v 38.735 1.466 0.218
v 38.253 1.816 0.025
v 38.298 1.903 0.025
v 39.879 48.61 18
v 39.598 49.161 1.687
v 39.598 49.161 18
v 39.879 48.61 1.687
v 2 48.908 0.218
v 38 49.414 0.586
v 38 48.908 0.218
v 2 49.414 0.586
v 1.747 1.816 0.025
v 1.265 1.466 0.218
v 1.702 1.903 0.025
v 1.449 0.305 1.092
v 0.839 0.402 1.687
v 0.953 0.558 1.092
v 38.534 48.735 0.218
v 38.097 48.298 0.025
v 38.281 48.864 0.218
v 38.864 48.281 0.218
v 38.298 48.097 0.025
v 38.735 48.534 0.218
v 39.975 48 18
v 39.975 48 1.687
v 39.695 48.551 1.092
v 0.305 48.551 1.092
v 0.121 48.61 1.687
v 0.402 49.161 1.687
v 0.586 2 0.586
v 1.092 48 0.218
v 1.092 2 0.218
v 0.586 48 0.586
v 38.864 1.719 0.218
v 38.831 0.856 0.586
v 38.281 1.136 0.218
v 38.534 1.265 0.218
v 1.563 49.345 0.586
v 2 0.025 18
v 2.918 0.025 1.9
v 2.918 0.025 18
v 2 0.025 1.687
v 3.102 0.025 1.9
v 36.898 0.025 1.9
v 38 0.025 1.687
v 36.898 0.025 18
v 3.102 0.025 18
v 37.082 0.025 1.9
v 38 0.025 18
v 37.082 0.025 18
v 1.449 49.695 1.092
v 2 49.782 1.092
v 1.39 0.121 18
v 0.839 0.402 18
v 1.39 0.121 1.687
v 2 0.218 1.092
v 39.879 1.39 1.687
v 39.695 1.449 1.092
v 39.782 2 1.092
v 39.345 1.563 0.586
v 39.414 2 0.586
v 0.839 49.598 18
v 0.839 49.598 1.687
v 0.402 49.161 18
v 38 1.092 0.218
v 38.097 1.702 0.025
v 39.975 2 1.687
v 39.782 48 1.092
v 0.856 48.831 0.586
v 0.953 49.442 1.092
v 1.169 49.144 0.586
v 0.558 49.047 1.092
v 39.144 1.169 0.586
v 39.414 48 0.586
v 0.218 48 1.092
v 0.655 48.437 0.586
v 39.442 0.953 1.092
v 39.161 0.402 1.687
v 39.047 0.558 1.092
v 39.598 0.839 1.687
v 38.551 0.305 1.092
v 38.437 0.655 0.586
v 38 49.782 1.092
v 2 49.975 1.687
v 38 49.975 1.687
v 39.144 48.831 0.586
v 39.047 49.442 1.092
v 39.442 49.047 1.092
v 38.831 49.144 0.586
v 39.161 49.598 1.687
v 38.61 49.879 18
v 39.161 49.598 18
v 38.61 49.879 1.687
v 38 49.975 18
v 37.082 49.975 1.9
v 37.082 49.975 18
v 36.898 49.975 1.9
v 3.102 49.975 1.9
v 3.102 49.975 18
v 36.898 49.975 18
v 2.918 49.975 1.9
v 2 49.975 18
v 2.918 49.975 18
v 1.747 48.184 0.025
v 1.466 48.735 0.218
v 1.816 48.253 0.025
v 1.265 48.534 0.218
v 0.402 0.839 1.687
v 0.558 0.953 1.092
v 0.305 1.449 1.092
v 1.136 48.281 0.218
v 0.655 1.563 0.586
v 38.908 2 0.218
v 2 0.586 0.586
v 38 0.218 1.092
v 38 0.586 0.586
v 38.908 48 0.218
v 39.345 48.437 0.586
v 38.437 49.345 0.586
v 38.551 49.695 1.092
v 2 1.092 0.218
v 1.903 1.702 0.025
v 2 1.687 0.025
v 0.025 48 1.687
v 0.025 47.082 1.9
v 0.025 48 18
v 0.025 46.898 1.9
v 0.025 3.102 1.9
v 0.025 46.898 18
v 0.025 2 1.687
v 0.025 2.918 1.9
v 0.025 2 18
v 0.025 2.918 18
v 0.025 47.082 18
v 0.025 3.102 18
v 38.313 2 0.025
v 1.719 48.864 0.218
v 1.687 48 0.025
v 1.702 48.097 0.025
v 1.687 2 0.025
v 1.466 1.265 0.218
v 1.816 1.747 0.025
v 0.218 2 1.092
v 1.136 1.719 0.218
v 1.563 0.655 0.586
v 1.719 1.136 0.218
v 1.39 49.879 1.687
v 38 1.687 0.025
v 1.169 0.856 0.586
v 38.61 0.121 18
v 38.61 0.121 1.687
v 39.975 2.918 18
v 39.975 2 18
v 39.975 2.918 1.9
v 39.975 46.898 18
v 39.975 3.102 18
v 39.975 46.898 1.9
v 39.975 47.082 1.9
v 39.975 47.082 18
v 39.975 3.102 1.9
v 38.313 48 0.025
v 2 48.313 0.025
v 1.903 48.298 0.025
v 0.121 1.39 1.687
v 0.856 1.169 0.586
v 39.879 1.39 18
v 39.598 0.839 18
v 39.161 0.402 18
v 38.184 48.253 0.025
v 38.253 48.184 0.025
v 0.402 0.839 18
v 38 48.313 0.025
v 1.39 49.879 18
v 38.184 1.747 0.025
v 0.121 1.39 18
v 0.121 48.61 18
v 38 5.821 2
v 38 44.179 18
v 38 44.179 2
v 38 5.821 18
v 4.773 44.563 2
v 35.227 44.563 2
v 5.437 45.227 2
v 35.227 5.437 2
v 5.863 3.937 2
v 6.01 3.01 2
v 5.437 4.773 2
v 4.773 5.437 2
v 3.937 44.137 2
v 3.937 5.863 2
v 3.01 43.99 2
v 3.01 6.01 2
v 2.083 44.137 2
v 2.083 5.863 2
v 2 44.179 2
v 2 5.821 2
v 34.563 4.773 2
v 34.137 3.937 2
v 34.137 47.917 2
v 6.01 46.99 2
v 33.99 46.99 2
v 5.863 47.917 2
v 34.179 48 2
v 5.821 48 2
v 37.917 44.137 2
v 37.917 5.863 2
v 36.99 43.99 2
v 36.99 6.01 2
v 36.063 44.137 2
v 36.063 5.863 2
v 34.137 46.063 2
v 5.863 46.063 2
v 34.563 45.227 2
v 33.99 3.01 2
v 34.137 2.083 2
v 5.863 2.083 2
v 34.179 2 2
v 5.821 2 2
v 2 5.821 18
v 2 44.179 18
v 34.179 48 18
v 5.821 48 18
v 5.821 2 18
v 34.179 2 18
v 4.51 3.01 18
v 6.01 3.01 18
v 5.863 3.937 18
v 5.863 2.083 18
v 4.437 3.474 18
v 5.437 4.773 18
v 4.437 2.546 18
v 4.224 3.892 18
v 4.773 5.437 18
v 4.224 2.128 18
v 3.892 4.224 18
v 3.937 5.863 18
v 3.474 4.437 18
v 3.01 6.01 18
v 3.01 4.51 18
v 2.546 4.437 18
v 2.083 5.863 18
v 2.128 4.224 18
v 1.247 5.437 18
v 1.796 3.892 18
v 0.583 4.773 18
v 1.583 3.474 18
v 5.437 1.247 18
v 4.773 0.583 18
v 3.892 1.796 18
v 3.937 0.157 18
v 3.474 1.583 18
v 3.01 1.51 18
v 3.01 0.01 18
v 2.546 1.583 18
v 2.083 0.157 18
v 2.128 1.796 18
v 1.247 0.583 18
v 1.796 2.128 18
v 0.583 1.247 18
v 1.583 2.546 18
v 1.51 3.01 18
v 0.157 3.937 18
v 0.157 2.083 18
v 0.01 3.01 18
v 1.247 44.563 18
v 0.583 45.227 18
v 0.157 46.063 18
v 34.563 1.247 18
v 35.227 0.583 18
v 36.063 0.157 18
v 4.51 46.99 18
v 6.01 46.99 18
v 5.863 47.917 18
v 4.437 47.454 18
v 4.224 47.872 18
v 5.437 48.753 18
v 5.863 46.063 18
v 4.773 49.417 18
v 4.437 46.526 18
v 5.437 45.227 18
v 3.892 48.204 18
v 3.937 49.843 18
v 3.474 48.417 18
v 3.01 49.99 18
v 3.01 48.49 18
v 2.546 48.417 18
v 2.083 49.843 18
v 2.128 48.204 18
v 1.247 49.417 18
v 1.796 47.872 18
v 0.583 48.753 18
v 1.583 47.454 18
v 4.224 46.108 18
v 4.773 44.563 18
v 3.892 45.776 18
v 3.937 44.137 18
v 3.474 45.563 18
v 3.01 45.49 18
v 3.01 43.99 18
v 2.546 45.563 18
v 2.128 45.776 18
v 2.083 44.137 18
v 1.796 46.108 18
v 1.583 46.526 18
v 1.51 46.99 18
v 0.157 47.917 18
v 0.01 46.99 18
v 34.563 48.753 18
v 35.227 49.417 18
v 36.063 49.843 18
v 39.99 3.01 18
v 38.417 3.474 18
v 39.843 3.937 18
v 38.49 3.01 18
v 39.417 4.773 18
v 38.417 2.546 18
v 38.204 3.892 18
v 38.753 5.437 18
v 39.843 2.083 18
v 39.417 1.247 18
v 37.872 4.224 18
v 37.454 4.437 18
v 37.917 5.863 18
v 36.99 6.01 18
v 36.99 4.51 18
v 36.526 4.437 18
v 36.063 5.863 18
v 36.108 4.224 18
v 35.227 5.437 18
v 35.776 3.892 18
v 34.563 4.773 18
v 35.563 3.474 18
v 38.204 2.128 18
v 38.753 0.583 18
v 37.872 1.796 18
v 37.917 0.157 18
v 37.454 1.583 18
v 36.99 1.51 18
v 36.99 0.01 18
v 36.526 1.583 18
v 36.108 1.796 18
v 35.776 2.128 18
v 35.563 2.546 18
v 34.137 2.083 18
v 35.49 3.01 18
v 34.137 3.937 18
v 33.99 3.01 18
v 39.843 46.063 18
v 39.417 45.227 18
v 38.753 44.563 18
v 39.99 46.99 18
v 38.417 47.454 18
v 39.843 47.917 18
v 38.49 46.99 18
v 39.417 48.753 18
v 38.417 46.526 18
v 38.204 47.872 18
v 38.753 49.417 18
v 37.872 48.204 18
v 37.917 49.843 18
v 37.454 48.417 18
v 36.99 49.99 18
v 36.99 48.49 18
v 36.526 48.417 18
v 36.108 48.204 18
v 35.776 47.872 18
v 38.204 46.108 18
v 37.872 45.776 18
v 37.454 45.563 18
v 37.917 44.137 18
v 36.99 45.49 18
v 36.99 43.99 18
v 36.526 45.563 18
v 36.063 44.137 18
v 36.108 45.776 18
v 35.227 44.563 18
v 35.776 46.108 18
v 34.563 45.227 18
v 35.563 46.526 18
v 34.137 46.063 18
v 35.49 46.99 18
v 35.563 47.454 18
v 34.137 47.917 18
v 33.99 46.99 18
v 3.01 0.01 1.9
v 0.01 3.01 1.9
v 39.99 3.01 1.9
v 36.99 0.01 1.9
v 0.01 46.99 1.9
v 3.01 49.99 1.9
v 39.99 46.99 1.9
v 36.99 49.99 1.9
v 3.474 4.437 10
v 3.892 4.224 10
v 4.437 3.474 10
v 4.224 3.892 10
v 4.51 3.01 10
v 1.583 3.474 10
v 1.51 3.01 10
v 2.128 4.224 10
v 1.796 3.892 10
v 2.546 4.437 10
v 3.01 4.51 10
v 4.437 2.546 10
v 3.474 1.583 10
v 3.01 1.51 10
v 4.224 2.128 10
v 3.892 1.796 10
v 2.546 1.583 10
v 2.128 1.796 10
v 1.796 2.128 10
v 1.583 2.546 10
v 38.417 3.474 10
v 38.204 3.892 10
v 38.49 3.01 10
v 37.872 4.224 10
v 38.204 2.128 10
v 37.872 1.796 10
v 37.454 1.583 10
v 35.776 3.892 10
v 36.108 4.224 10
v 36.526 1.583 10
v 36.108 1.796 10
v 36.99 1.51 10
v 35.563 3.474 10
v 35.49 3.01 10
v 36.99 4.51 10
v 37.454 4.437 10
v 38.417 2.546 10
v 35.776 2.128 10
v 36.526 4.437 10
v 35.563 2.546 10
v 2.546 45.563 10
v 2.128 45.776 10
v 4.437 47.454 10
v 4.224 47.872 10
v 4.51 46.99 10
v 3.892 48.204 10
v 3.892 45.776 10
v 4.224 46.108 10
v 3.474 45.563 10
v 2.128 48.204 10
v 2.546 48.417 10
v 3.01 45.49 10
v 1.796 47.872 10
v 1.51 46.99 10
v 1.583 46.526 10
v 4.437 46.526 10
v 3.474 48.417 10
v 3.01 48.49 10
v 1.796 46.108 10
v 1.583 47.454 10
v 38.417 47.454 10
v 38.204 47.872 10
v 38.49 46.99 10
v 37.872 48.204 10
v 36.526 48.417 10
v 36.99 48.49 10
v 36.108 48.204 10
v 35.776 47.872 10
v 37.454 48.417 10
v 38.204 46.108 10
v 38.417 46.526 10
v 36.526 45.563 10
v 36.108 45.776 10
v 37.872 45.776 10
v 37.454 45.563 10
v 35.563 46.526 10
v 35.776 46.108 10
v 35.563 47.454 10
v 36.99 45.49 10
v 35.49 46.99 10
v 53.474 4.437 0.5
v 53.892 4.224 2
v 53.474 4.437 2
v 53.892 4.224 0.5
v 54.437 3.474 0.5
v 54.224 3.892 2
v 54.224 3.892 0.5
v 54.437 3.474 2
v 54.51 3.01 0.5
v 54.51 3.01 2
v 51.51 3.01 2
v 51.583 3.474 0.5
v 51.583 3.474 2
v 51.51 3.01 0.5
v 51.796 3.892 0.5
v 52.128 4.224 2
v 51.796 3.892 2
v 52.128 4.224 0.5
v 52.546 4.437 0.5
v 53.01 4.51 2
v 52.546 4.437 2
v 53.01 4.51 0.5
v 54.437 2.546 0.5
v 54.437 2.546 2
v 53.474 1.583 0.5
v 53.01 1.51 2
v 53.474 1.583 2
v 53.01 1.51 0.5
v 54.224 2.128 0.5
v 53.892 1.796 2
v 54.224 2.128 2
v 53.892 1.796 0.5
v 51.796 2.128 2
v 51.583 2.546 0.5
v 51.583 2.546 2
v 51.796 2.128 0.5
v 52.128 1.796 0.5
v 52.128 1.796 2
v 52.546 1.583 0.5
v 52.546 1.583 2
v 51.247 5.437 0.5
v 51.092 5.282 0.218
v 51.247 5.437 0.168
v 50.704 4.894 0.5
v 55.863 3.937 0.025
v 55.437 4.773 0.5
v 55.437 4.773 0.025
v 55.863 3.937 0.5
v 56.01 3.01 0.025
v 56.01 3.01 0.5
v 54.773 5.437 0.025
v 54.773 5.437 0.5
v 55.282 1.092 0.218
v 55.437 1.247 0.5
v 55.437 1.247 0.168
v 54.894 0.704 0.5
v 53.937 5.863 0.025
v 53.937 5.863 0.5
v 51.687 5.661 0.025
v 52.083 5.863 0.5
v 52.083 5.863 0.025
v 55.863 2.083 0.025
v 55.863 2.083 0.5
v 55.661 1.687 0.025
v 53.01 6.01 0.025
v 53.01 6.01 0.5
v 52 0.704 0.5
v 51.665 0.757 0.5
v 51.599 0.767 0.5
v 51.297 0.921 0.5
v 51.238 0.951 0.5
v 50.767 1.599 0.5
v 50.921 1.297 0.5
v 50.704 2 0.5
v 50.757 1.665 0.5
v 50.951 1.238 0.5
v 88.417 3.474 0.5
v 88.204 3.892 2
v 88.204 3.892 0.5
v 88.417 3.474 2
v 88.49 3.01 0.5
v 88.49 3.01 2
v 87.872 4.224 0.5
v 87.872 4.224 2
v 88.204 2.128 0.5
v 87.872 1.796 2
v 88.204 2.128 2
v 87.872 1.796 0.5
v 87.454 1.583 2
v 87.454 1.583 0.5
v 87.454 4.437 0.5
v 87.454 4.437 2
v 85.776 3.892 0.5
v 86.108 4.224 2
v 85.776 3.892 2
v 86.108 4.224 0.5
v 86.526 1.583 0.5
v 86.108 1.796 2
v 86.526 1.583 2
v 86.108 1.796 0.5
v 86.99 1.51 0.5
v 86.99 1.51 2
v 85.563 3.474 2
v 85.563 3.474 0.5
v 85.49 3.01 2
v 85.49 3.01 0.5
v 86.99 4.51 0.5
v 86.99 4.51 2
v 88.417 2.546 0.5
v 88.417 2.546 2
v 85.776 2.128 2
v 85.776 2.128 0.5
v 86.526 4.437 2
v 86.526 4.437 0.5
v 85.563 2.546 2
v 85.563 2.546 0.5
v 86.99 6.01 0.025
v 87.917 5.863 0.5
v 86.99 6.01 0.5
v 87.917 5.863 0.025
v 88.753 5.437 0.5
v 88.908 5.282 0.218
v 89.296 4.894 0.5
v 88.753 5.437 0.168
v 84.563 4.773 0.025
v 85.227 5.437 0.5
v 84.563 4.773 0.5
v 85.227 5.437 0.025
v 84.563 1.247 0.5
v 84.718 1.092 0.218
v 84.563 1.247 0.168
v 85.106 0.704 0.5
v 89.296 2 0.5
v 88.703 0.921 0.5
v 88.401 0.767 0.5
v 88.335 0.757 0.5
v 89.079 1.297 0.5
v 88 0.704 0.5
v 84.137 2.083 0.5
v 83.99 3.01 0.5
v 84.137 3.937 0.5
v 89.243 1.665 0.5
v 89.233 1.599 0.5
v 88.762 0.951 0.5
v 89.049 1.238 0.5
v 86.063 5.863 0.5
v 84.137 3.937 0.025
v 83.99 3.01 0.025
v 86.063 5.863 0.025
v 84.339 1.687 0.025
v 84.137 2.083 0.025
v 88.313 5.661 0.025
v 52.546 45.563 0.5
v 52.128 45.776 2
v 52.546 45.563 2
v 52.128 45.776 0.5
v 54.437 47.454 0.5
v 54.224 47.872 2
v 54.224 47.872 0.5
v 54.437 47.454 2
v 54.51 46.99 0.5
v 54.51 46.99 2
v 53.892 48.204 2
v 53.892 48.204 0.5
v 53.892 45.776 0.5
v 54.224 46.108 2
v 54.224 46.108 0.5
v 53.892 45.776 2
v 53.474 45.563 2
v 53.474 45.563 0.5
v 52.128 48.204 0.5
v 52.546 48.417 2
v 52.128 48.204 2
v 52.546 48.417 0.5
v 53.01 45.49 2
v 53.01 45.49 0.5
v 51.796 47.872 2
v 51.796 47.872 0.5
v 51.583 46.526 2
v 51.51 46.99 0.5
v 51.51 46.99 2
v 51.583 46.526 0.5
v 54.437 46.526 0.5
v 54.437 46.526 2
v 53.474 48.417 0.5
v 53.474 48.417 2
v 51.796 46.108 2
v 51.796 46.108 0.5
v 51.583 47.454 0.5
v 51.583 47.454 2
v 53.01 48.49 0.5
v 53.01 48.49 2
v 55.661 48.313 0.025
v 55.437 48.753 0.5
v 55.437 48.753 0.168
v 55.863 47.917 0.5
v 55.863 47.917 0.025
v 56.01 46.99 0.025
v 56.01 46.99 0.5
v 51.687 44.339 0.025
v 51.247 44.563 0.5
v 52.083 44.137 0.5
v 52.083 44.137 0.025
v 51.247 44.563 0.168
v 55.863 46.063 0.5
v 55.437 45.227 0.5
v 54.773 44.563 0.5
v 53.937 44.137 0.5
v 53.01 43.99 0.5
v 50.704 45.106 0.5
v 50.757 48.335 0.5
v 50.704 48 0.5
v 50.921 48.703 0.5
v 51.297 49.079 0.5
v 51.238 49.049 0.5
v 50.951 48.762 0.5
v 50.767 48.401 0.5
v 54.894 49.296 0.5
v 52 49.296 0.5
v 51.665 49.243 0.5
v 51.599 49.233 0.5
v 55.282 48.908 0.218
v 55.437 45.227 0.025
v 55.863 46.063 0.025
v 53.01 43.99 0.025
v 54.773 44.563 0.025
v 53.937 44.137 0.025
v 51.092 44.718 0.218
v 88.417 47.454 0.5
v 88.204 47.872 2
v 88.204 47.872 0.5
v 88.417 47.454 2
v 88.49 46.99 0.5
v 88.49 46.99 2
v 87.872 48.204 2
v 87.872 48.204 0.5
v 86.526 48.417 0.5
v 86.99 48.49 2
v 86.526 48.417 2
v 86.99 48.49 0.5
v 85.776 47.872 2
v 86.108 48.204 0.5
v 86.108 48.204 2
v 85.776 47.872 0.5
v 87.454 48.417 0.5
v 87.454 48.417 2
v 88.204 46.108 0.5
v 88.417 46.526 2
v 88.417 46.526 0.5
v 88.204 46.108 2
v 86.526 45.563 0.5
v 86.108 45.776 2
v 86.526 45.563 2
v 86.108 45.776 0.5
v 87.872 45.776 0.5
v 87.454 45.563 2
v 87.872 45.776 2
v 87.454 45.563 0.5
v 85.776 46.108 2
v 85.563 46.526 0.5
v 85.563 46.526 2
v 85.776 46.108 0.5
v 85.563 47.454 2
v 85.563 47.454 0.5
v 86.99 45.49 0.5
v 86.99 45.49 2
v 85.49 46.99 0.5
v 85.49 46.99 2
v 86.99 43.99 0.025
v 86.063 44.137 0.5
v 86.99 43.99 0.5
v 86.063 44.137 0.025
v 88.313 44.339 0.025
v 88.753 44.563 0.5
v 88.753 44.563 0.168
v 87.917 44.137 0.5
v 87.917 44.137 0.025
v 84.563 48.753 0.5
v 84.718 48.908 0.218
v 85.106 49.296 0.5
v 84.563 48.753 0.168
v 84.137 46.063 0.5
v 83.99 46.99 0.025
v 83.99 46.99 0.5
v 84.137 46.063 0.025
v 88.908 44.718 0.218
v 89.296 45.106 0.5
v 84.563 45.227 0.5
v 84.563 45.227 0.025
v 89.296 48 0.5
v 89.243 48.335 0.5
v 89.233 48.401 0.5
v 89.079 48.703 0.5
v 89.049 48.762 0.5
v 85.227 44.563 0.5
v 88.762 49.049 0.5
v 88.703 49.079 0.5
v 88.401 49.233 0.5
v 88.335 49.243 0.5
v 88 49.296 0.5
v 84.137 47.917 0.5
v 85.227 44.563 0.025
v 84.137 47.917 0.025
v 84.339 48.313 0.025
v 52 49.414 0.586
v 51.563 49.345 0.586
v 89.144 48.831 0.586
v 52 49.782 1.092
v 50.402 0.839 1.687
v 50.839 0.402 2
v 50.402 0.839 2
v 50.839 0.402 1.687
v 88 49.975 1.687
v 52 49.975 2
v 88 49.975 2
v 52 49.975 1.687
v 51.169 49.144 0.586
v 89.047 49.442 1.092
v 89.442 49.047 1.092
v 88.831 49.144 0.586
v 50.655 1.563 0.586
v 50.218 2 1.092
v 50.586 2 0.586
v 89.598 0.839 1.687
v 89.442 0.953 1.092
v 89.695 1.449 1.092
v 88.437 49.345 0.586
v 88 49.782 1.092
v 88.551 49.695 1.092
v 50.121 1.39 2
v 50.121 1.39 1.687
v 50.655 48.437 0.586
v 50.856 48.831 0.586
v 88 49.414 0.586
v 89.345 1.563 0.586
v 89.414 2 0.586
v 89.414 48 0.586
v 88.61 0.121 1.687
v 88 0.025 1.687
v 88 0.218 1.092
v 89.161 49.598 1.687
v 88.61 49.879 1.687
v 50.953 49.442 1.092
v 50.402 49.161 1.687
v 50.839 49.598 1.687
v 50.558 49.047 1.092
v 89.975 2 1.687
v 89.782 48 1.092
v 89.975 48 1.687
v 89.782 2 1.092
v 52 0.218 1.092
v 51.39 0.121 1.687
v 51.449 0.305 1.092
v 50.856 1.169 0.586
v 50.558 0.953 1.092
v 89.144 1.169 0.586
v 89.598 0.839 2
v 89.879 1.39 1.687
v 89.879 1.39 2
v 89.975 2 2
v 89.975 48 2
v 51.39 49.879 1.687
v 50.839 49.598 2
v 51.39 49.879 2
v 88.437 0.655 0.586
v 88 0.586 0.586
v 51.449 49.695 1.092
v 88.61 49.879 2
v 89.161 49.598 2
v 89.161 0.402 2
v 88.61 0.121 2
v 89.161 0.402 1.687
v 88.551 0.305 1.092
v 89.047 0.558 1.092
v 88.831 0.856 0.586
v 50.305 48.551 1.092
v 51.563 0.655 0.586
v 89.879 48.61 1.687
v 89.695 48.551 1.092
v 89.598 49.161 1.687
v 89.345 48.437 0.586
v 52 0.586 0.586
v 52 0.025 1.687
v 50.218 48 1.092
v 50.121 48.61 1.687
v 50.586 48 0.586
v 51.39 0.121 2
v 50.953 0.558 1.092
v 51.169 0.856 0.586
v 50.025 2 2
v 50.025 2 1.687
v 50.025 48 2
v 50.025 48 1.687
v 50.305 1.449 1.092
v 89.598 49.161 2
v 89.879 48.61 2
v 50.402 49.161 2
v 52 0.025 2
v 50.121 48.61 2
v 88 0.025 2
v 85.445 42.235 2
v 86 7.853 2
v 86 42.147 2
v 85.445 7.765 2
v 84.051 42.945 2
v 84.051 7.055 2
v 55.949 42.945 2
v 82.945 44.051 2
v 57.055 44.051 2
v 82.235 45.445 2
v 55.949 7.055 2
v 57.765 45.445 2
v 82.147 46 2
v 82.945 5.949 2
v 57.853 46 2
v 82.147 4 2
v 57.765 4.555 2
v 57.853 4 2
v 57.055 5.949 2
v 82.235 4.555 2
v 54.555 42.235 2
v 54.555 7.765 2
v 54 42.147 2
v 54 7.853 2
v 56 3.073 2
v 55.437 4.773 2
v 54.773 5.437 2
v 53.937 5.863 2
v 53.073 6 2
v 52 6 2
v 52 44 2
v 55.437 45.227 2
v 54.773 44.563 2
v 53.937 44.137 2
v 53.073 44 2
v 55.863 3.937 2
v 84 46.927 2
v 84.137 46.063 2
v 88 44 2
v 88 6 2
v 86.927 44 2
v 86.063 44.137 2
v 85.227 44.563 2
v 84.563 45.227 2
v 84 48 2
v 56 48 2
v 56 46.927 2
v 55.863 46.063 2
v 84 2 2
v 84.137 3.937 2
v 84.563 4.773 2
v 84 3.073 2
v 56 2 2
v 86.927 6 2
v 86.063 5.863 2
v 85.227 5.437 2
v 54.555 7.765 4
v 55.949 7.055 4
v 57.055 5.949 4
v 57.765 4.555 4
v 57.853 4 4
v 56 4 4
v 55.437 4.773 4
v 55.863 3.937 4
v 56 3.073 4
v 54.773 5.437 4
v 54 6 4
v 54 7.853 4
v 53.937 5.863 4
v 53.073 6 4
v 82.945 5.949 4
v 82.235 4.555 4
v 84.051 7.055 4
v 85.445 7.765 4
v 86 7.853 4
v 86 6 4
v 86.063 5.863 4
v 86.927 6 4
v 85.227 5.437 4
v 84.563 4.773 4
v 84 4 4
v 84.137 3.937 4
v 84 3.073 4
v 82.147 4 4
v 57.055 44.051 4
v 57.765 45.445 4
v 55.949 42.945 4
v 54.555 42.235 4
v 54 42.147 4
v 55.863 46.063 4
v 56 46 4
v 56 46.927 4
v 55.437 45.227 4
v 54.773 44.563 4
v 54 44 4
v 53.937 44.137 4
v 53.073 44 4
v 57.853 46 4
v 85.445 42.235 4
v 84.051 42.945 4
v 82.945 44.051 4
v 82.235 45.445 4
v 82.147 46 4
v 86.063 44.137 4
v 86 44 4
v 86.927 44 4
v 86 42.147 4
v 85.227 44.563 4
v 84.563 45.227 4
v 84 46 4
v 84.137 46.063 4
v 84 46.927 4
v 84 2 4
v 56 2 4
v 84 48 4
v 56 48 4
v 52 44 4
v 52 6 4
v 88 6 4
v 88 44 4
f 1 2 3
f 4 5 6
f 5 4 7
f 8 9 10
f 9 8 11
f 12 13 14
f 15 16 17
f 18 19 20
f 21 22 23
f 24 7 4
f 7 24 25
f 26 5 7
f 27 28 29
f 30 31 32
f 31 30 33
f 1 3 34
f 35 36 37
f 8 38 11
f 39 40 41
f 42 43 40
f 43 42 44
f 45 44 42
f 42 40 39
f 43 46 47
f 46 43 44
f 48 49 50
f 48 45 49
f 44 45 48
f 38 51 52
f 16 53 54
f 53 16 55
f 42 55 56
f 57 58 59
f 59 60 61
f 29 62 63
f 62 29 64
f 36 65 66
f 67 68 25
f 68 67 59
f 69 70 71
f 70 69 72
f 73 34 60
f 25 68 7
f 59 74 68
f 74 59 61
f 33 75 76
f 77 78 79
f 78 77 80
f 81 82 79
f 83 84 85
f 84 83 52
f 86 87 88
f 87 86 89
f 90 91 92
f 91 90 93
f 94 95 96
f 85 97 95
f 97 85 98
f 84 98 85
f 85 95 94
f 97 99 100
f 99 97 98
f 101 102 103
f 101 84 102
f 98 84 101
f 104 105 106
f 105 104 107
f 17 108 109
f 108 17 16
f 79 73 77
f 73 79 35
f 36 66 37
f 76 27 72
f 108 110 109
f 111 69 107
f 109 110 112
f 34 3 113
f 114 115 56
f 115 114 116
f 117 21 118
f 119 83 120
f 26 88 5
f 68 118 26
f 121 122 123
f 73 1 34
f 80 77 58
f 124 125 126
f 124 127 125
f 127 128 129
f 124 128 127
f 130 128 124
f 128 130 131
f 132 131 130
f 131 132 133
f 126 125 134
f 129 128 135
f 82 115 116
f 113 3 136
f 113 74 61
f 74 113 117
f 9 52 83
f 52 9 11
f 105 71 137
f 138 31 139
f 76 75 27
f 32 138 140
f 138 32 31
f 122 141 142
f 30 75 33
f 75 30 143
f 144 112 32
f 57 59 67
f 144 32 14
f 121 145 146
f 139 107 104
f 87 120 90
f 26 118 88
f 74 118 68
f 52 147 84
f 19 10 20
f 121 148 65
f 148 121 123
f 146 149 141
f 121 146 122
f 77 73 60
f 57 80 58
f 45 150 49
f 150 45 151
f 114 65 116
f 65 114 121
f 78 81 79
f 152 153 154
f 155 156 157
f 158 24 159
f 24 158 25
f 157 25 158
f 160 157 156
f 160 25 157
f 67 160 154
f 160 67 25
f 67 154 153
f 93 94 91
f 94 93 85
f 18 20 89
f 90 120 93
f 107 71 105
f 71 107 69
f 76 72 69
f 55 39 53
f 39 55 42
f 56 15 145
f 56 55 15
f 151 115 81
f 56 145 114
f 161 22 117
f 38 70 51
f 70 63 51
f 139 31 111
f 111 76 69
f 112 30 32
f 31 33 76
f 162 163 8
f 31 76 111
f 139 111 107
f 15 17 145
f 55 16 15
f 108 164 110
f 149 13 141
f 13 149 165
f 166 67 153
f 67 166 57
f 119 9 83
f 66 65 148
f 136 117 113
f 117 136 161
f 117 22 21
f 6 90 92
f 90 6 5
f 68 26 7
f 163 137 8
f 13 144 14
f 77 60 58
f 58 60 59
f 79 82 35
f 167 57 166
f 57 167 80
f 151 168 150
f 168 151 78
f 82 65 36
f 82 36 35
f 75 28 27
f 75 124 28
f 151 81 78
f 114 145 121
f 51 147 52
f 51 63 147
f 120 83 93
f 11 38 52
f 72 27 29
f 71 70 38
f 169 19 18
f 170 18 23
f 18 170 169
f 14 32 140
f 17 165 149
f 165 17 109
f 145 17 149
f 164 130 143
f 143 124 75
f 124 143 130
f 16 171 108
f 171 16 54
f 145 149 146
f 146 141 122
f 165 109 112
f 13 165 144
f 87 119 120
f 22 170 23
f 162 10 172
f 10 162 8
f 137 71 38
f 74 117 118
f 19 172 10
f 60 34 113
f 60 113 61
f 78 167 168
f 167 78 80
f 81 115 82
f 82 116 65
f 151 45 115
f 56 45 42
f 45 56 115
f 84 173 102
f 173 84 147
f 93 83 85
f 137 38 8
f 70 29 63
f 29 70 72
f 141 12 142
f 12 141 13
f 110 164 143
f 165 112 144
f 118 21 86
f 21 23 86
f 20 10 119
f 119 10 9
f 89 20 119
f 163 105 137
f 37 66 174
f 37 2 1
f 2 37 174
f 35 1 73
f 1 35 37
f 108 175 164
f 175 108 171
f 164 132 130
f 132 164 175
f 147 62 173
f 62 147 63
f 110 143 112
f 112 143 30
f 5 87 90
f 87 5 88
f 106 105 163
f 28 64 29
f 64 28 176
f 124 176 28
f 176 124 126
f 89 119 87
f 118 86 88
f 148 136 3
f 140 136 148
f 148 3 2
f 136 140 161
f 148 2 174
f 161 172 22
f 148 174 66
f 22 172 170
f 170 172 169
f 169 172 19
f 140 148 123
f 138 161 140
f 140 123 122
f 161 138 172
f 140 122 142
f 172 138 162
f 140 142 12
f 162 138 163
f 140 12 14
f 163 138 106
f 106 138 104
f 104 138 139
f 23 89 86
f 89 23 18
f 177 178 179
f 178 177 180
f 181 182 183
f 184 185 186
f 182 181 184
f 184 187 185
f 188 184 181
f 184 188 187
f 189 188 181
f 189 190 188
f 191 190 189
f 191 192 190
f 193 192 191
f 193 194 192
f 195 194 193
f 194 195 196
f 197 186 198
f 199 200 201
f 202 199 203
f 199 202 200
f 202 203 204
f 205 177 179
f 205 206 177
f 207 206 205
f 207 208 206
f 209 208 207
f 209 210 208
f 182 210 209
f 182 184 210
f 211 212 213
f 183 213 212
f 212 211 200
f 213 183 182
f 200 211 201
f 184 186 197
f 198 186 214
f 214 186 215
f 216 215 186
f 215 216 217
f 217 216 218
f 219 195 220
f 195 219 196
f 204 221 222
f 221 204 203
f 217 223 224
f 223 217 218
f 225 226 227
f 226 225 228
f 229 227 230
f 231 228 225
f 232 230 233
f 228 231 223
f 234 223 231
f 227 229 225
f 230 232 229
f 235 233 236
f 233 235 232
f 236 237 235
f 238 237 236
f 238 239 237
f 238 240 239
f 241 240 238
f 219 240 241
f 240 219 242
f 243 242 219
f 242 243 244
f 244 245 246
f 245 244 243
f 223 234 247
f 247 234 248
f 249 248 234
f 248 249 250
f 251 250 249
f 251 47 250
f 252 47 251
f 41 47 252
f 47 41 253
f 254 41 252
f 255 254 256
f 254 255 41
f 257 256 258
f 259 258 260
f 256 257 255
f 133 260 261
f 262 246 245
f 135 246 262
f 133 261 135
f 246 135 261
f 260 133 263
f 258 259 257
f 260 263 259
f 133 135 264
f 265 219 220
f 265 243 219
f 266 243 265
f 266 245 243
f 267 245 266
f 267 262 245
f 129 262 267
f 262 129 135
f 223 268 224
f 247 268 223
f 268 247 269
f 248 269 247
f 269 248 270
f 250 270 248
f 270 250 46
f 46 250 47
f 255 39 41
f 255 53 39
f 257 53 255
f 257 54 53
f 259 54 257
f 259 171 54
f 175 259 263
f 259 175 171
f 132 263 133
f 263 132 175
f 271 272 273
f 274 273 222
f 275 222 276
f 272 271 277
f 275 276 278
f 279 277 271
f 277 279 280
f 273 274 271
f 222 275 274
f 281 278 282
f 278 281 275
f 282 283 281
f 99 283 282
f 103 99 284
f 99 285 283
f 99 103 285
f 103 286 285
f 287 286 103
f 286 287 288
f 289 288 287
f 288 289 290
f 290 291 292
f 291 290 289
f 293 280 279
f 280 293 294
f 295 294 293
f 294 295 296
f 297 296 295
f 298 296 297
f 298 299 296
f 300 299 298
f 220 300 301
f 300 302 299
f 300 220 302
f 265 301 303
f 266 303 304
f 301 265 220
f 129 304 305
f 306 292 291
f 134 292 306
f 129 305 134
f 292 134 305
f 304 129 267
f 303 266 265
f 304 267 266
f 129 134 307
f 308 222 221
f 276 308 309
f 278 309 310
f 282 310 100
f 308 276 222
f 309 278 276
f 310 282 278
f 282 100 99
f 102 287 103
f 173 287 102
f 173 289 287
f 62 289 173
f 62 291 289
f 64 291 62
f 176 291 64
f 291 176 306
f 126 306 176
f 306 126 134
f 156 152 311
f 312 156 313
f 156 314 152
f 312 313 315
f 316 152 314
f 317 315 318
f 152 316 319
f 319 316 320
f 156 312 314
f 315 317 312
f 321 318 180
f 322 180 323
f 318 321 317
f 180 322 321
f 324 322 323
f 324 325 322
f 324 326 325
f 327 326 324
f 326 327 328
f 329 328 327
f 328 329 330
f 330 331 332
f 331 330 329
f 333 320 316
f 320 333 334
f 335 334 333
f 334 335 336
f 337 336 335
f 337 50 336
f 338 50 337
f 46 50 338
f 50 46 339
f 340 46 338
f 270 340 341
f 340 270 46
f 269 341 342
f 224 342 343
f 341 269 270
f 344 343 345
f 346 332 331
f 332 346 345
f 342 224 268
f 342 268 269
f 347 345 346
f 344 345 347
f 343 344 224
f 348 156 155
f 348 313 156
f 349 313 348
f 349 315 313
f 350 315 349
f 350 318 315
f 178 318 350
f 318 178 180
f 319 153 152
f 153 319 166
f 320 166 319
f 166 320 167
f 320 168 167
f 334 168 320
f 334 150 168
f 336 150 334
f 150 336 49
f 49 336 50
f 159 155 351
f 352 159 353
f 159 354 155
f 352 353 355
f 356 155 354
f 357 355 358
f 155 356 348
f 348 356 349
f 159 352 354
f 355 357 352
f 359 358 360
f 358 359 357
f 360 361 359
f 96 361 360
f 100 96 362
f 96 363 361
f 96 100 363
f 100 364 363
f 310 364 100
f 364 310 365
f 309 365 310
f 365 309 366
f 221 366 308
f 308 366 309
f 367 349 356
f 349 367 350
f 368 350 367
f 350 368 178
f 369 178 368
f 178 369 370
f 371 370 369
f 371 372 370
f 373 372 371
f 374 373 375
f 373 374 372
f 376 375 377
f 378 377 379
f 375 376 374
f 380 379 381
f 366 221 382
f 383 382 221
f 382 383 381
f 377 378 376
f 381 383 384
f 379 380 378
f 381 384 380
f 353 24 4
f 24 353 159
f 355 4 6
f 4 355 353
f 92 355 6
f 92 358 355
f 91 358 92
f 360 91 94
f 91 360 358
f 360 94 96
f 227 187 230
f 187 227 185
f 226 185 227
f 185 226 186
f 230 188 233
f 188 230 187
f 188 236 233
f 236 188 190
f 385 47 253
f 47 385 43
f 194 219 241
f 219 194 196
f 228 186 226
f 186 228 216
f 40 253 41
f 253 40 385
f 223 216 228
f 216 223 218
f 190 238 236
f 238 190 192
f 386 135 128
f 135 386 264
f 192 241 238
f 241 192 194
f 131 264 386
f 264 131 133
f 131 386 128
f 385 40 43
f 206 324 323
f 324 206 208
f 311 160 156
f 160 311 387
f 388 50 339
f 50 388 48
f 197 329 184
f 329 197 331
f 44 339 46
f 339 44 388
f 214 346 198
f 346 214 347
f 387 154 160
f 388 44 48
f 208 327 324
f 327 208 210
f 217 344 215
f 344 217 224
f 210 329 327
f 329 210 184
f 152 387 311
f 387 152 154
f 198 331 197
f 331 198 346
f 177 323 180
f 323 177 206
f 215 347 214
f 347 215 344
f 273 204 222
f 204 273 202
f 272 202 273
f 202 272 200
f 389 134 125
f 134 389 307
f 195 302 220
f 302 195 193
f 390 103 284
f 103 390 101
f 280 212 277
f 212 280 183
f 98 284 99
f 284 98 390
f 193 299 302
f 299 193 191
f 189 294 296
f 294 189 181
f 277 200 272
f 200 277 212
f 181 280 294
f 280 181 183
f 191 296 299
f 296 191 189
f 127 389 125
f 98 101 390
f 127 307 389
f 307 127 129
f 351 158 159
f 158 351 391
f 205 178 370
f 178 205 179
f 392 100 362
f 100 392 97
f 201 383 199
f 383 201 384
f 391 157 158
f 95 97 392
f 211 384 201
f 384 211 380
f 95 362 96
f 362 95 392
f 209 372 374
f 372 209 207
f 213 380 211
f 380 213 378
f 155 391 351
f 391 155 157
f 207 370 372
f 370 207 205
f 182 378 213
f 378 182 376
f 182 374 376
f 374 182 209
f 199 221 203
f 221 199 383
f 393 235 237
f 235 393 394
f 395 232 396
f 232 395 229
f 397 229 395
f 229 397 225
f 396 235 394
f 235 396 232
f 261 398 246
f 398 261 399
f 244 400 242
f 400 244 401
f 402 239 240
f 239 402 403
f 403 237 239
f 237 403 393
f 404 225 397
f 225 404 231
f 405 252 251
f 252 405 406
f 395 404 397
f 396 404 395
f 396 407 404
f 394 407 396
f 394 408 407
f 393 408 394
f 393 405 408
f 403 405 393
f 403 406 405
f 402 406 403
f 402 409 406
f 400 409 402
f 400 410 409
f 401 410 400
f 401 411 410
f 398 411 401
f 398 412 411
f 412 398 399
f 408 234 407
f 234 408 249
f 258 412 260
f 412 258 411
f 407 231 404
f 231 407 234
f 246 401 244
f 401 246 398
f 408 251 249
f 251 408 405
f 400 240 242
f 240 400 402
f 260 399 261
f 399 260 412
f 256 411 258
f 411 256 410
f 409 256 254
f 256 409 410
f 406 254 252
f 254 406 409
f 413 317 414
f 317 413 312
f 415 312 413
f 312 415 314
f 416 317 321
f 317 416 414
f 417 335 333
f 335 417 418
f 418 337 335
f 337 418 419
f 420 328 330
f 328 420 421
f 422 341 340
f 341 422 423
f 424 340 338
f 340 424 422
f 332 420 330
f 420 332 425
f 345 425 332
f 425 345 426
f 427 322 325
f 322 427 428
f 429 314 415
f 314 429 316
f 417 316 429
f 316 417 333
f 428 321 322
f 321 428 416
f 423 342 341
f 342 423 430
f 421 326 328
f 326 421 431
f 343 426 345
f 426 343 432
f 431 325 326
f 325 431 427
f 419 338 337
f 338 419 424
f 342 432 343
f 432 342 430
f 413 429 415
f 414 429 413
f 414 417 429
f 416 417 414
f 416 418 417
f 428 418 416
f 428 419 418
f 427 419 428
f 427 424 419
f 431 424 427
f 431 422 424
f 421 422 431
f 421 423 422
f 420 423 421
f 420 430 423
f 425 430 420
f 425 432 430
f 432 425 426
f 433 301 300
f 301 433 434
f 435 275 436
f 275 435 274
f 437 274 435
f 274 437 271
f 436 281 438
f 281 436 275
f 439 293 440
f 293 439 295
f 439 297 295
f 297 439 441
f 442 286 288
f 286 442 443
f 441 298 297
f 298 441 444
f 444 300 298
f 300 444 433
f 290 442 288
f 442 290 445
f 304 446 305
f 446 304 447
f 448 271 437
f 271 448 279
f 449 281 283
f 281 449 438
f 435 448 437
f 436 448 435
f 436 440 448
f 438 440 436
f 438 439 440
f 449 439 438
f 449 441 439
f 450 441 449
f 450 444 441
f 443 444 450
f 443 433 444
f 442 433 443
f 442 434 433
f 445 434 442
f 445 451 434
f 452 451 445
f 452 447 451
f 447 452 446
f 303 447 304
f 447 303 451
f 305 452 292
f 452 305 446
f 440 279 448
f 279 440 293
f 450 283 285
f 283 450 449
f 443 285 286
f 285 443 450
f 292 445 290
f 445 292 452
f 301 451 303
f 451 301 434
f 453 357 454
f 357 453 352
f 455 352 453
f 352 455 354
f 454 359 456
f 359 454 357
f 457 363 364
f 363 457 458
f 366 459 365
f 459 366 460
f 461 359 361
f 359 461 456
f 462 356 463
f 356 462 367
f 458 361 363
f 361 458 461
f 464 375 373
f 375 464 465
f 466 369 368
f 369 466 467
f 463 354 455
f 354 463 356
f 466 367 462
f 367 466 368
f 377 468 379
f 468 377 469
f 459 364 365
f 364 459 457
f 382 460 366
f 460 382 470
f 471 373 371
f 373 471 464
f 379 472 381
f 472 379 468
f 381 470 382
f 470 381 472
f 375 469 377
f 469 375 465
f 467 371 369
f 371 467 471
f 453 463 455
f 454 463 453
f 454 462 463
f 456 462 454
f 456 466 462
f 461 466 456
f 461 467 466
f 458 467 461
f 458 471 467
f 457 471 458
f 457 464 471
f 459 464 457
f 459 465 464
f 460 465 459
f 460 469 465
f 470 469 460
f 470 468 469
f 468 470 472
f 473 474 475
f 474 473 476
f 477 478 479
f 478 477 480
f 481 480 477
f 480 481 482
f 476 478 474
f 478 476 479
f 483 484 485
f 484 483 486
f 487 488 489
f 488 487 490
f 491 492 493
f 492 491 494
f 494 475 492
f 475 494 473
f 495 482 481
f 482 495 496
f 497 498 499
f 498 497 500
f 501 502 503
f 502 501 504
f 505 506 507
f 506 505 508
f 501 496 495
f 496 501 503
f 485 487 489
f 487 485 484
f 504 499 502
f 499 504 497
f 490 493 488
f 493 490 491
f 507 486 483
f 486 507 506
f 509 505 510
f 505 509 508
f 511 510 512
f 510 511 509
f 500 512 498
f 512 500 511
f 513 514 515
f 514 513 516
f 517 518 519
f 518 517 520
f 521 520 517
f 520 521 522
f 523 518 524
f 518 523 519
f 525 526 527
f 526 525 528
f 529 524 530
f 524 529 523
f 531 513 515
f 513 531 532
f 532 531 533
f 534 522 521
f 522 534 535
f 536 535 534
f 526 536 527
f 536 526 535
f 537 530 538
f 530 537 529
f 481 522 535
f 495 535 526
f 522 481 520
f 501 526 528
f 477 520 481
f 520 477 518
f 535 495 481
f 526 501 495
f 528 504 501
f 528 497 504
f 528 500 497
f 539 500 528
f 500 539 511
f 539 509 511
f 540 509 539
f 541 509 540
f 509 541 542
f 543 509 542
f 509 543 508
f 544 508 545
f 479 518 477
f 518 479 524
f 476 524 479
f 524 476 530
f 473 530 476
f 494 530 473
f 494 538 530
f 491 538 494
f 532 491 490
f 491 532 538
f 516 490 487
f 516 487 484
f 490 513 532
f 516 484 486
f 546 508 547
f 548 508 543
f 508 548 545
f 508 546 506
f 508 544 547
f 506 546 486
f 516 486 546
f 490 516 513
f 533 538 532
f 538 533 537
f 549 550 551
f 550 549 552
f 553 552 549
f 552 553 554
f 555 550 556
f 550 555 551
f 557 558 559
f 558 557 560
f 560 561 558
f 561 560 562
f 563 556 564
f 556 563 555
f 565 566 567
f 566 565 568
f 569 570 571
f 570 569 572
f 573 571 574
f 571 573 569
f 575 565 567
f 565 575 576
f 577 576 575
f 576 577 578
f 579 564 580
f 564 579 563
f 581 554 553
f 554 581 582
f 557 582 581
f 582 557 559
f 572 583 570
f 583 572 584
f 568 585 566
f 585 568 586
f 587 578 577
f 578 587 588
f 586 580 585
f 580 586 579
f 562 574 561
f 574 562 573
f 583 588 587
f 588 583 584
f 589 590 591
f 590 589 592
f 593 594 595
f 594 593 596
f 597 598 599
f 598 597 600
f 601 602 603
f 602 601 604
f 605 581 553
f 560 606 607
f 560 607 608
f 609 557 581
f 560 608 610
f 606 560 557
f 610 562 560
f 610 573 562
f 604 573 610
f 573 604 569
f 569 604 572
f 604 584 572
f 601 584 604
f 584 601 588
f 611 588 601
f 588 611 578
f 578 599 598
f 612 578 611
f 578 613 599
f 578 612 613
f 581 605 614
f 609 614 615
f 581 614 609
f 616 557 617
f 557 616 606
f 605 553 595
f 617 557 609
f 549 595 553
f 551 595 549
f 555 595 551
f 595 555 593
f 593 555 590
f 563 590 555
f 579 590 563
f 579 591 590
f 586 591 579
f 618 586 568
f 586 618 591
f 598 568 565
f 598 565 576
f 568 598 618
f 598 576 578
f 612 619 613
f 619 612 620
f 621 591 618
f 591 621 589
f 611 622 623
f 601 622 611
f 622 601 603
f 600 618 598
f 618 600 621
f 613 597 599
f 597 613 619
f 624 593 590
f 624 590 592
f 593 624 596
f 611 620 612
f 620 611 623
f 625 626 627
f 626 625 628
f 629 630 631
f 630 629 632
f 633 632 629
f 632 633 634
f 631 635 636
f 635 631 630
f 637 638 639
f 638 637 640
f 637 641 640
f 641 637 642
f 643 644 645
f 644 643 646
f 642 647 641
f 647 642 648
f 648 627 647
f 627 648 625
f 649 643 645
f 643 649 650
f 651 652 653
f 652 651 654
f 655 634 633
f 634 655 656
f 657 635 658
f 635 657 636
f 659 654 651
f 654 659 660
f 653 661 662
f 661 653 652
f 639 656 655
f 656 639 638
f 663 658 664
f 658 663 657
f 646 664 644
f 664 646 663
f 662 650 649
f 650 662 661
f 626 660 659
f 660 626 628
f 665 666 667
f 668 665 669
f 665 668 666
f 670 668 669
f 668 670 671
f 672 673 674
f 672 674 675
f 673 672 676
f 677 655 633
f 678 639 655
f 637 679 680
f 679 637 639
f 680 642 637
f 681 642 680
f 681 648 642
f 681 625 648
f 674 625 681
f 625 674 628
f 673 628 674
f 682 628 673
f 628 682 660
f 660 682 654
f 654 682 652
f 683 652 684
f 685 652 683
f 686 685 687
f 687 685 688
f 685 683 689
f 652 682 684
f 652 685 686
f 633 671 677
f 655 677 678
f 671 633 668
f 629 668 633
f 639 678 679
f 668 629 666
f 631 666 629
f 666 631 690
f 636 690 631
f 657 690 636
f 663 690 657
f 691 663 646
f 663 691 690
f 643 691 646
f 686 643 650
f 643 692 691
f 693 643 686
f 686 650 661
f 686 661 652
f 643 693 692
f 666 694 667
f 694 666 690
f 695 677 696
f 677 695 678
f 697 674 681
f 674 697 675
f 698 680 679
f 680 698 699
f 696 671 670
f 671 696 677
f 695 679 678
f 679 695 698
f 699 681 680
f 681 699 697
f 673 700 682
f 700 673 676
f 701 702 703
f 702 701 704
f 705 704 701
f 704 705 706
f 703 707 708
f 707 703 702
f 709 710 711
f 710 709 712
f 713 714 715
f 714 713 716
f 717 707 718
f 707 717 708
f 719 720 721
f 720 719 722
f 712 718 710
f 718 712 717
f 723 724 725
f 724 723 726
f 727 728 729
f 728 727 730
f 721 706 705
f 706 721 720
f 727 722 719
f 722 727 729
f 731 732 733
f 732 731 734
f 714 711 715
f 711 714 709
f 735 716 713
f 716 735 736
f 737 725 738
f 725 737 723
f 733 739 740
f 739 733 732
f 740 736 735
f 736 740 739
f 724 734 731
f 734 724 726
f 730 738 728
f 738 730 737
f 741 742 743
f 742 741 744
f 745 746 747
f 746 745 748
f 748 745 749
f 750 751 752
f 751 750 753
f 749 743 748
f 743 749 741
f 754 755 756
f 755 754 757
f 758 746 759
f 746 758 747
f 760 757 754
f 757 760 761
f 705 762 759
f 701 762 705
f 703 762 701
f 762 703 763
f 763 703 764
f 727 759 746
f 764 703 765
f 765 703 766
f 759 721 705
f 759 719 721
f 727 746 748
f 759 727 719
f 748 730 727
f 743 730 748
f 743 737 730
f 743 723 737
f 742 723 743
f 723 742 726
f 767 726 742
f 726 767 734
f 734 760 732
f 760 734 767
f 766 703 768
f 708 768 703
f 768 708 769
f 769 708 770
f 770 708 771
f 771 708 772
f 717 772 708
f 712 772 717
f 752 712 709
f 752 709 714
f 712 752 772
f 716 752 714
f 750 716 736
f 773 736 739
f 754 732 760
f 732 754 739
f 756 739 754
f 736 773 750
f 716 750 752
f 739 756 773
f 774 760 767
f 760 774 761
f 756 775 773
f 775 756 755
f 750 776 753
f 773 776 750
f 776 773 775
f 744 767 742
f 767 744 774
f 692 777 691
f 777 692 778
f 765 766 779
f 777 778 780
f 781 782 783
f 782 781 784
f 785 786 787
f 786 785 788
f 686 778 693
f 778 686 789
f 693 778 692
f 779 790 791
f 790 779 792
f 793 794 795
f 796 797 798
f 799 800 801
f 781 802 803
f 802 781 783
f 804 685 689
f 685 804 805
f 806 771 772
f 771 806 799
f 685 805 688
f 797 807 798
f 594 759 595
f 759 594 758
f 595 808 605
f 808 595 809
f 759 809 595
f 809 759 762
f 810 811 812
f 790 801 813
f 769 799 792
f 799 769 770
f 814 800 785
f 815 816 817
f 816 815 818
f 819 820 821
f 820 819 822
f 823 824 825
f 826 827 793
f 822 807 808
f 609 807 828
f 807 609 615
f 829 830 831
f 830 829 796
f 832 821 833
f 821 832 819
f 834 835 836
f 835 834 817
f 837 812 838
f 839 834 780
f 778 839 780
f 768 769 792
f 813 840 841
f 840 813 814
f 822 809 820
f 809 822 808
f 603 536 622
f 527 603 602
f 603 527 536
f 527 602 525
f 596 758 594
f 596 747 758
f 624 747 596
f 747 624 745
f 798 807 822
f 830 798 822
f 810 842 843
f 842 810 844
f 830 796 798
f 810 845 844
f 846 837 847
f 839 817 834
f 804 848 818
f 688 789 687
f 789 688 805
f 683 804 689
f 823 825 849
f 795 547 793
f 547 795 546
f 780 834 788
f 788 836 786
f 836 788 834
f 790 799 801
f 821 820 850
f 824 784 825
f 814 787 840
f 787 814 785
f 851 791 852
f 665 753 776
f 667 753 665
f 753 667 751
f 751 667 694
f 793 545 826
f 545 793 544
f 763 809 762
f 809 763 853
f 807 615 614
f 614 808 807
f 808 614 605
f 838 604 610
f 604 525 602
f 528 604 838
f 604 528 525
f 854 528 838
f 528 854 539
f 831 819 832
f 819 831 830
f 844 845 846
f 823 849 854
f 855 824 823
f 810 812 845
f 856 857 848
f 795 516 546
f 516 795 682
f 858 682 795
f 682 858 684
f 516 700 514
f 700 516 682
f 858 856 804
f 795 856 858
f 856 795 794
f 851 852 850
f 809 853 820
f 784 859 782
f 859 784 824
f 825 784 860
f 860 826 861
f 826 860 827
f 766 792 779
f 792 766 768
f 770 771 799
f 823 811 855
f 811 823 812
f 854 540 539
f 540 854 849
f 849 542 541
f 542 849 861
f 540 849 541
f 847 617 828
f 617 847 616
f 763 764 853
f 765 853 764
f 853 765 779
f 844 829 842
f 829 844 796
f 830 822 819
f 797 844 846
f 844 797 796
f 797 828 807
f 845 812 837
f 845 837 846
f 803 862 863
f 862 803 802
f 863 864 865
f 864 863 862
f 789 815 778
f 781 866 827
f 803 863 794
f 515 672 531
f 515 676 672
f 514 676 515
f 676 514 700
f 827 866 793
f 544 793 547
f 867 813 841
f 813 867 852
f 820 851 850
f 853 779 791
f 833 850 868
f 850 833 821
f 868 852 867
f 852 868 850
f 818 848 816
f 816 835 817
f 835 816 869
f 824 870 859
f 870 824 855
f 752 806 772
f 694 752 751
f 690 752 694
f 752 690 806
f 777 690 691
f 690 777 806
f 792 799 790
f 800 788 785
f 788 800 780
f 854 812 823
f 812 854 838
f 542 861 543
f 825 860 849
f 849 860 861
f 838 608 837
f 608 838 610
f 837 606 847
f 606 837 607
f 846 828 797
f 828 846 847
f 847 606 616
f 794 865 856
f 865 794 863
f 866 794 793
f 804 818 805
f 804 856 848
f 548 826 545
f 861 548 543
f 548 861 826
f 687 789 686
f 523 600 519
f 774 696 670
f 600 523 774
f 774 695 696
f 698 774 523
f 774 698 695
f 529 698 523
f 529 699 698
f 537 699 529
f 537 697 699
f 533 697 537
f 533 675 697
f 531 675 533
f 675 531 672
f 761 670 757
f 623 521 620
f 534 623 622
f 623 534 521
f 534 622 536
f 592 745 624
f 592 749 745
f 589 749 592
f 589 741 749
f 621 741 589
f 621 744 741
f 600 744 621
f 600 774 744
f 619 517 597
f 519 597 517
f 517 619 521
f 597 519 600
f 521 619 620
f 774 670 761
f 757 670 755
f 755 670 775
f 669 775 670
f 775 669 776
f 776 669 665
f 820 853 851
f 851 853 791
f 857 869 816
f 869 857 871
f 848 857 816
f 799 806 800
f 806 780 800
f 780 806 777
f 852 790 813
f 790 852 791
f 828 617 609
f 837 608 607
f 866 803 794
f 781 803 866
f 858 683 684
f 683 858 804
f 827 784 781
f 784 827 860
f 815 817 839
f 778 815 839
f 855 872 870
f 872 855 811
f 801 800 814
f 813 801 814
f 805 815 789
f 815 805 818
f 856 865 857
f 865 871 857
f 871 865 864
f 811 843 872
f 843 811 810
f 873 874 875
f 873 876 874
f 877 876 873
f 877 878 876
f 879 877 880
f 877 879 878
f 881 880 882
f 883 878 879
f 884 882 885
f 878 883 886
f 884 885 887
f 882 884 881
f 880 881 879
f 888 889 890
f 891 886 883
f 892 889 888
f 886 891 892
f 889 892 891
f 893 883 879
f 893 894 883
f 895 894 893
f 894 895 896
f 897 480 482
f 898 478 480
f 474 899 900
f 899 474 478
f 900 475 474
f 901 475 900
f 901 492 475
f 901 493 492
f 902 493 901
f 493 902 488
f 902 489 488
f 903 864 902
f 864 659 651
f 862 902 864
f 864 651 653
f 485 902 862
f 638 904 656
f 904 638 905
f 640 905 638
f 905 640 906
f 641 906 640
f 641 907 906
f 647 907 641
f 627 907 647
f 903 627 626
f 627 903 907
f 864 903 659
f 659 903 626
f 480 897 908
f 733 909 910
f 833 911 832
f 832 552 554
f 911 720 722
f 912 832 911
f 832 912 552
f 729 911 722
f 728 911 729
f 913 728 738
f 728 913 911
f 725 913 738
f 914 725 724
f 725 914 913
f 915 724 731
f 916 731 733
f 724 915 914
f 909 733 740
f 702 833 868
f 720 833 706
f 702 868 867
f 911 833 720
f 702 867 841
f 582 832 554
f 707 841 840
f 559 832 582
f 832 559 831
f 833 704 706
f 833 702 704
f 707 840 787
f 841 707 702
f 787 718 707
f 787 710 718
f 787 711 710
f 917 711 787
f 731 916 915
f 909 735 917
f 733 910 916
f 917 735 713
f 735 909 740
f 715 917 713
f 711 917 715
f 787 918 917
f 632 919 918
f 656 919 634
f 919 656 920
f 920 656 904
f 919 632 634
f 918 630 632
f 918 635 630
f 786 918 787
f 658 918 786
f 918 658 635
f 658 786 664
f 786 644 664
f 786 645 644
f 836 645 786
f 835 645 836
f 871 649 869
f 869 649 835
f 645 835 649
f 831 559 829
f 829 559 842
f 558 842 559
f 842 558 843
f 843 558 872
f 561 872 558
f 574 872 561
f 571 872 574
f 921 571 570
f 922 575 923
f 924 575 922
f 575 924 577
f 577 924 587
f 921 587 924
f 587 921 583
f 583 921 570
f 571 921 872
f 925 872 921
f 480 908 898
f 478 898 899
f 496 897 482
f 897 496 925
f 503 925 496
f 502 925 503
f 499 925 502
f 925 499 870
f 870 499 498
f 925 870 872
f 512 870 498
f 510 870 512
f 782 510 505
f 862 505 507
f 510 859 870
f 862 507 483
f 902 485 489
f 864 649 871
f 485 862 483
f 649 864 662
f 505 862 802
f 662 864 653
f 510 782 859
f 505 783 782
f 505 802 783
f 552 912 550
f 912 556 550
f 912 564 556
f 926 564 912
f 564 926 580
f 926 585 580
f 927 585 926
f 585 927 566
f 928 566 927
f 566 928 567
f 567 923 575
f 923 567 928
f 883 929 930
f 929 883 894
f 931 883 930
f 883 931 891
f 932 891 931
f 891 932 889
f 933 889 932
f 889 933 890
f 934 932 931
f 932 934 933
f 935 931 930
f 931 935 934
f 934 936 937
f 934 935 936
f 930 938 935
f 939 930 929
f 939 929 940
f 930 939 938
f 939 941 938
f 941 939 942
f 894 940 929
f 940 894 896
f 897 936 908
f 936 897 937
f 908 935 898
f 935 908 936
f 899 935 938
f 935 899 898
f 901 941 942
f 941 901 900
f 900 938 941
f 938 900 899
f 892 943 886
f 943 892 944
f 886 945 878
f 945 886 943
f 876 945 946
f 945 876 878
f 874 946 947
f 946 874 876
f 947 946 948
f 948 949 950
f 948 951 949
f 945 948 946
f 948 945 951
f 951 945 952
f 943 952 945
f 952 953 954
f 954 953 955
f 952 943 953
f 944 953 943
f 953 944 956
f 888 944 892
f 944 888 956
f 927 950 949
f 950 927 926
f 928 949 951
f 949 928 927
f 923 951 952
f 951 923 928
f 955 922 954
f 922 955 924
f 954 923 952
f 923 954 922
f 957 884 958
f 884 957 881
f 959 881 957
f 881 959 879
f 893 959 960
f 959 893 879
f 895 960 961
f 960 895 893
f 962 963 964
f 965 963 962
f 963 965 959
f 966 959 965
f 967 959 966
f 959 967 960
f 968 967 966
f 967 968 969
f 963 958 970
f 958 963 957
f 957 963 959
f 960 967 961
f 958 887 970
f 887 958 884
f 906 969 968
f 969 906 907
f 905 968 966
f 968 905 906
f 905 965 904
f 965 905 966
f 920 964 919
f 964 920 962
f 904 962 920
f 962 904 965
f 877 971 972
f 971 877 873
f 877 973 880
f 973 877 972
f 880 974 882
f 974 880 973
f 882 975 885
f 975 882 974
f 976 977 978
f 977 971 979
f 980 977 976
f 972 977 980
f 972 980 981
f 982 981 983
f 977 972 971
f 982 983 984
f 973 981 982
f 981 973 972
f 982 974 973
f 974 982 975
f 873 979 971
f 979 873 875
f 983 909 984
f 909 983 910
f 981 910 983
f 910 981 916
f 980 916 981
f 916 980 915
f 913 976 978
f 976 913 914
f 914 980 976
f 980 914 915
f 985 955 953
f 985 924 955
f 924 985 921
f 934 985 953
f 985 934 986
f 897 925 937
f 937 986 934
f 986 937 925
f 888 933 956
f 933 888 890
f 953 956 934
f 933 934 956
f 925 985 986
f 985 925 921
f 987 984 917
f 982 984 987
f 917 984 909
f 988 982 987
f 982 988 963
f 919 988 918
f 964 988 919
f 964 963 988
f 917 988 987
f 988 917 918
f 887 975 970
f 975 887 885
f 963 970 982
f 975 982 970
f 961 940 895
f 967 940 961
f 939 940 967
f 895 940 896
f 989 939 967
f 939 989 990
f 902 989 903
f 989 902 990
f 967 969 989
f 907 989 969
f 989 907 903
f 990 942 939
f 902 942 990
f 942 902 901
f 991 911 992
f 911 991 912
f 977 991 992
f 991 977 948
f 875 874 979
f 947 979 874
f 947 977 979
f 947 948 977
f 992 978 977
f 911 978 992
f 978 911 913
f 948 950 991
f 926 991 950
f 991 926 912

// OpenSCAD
/* Generic case design - GNU GPL V3.0
   (C) David Pye 2017 davidmpye@gmail.com
*/

//Box definitions.
wall_thickness=2;
corner_radius = 2;
outer_x = 40;
outer_y= 50;
outer_z = 20;


//Define your screw hole diameter and depth for fixing the lid on
screw_hole_dia = 3;
screw_hole_depth = 10;

screw_hole_head_countersink_dia = 6;
screw_hole_head_countersink_depth = 0.5;

//This usually seems sensible, but you might need to adjust it for strange combinations of screw hole and box corner radius to ensure your pillars are 'fused' suitably with the sides of the box. - can go negative as well as positive if needed.
pillar_offset_tweak = 0;


$fn=20;
pillar_dia = screw_hole_dia +3;

//Coordinates for where the four pillar centres should be.
 corner_hole_centres = [ [pillar_dia/2+pillar_offset_tweak + 0.01,pillar_dia/2 + pillar_offset_tweak +0.01,0],
            [outer_x - (pillar_dia/2+ pillar_offset_tweak +  0.01),pillar_dia/2+ pillar_offset_tweak +  0.01,0],
            [pillar_dia/2+ pillar_offset_tweak +0.01, outer_y - (pillar_dia/2+ pillar_offset_tweak +0.01),0],
            [outer_x- (pillar_dia/2+ pillar_offset_tweak +0.01),outer_y- ( pillar_dia/2+ pillar_offset_tweak +0.01),0]
            ];
             
            
echo ( "The INSIDE box diameters are (X:Y)");
echo (outer_x - wall_thickness*2);
echo (outer_y - wall_thickness*2);
echo ( "Hole centres:");
for (i = corner_hole_centres) echo(i);

echo ("Taking into account the pillars, the space between them is:");
echo ("X:");
echo (corner_hole_centres[1][0] - corner_hole_centres[0][0] - pillar_dia);
echo ("Y:");
echo (corner_hole_centres[2][1] - corner_hole_centres[0][1] - pillar_dia);


make_box(outer_x, outer_y, outer_z, screw_hole_dia, screw_hole_depth);
translate([outer_x + 10, 0, 0]) make_lid(outer_x, outer_y, outer_z, screw_hole_dia);


//example internal item to demonstrate fit.
//translate([corner_hole_centres[0][1]+pillar_dia/2 + 0.1,0,wall_thickness+0.1]) cube([28-0.1, 46-0.1, 5]);



module make_box(x,y,z,screw_hole_dia, hole_depth) {
    difference() {
        union() {
            difference() {    
                //First, make a rounded-corners-cube using rectangle + circle + minkowski sum of the two
                translate([ wall_thickness, wall_thickness, wall_thickness]) {
                    minkowski() {
                        cube([x - 2*corner_radius,y - 2*corner_radius ,z - 2*corner_radius]);  
                        sphere(r=corner_radius, center=true);   
                }
            }
    
            //Now hollow it out.
            translate([wall_thickness, wall_thickness, wall_thickness]) 
            cube([x-wall_thickness*2, y-wall_thickness*2, z-wall_thickness]);
        
            //Now chop off the lid.
            translate([0,0,z-wall_thickness]) cube([x,y,wall_thickness+1]);
        }   
        //Union in the screwhole pillars.
        for (i = corner_hole_centres) translate([0,0,wall_thickness-0.1]) translate(i) 
                        cylinder(r=pillar_dia/2, h=0.1 + z-2*wall_thickness);
       
    }
    
    //Subtract out the holes for the screwholes (consider using polyholes depending on your slicer!)
    for (i=corner_hole_centres) translate(0,0,wall_thickness-0.1)
           translate(i) translate([0,0, z - hole_depth]) cylinder(r=screw_hole_dia/2, h=hole_depth+0.1);
    }
 }
    

module make_lid (x,y,z, screw_hole_dia) {
    union() {
        difference() {
            translate([ wall_thickness, wall_thickness, 0]) {
                        minkowski() {
                            cube([x - 2*corner_radius,y - 2*corner_radius , wall_thickness]);  
                            translate([0,0,corner_radius]) sphere(r=corner_radius, center=true);   
                        }
            }
            //chop the lid to the correct thickness (wall thickness!)
            translate([0,0,wall_thickness]) cube([x,y,z]);
            for (i=corner_hole_centres) {
                    //make hole in lid for screw shaft
                    translate(i)  cylinder(r=screw_hole_dia/2, h = wall_thickness+0.1);
                    //countersunk hole for screw head.
                    translate(i) cylinder(r=screw_hole_head_countersink_dia/2, h=screw_hole_head_countersink_depth);
             }
        }
            
        /* Build the lip - corner curve pieces to clear the pillars */
        translate(corner_hole_centres[0])  translate([0,0,wall_thickness-0.01])   rotate(a=90) 
        quarter_hole(pillar_dia/2, wall_thickness);
        translate(corner_hole_centres[1])  translate([0,0,wall_thickness-0.01])   rotate(a=180) 
        quarter_hole(pillar_dia/2, wall_thickness);
        translate(corner_hole_centres[2])  translate([0,0,wall_thickness-0.01])   rotate(a=0) 
        quarter_hole(pillar_dia/2, wall_thickness);
        translate(corner_hole_centres[3])  translate([0,0,wall_thickness-0.01])   rotate(a=-90) 
        quarter_hole(pillar_dia/2, wall_thickness);
        
        /* Wall part of the lip */
        translate([pillar_dia,wall_thickness,wall_thickness]) cube([x - pillar_dia*2 ,wall_thickness, wall_thickness]);
        translate([pillar_dia,y - wall_thickness*2 ,wall_thickness]) cube([x - pillar_dia*2,wall_thickness, wall_thickness]);
        translate([wall_thickness, pillar_dia ,wall_thickness]) cube([wall_thickness, y - pillar_dia*2, wall_thickness]);
        translate([x - wall_thickness*2, pillar_dia , wall_thickness]) cube([wall_thickness, y - pillar_dia*2, wall_thickness]);
    }
}

module quarter_hole(radius, wall_thickness) {
        difference() {
            cylinder (r=radius + wall_thickness, h= wall_thickness+0.01);
            cylinder (r=radius, h= wall_thickness + 0.1);
            translate([-radius*2, 0,0 ]) cube([pillar_dia*2, radius*4, wall_thickness*2]);
            translate([-radius*2,  -radius*2,  0]) cube([radius*2, radius*2, wall_thickness*2]);
        }
    
}
